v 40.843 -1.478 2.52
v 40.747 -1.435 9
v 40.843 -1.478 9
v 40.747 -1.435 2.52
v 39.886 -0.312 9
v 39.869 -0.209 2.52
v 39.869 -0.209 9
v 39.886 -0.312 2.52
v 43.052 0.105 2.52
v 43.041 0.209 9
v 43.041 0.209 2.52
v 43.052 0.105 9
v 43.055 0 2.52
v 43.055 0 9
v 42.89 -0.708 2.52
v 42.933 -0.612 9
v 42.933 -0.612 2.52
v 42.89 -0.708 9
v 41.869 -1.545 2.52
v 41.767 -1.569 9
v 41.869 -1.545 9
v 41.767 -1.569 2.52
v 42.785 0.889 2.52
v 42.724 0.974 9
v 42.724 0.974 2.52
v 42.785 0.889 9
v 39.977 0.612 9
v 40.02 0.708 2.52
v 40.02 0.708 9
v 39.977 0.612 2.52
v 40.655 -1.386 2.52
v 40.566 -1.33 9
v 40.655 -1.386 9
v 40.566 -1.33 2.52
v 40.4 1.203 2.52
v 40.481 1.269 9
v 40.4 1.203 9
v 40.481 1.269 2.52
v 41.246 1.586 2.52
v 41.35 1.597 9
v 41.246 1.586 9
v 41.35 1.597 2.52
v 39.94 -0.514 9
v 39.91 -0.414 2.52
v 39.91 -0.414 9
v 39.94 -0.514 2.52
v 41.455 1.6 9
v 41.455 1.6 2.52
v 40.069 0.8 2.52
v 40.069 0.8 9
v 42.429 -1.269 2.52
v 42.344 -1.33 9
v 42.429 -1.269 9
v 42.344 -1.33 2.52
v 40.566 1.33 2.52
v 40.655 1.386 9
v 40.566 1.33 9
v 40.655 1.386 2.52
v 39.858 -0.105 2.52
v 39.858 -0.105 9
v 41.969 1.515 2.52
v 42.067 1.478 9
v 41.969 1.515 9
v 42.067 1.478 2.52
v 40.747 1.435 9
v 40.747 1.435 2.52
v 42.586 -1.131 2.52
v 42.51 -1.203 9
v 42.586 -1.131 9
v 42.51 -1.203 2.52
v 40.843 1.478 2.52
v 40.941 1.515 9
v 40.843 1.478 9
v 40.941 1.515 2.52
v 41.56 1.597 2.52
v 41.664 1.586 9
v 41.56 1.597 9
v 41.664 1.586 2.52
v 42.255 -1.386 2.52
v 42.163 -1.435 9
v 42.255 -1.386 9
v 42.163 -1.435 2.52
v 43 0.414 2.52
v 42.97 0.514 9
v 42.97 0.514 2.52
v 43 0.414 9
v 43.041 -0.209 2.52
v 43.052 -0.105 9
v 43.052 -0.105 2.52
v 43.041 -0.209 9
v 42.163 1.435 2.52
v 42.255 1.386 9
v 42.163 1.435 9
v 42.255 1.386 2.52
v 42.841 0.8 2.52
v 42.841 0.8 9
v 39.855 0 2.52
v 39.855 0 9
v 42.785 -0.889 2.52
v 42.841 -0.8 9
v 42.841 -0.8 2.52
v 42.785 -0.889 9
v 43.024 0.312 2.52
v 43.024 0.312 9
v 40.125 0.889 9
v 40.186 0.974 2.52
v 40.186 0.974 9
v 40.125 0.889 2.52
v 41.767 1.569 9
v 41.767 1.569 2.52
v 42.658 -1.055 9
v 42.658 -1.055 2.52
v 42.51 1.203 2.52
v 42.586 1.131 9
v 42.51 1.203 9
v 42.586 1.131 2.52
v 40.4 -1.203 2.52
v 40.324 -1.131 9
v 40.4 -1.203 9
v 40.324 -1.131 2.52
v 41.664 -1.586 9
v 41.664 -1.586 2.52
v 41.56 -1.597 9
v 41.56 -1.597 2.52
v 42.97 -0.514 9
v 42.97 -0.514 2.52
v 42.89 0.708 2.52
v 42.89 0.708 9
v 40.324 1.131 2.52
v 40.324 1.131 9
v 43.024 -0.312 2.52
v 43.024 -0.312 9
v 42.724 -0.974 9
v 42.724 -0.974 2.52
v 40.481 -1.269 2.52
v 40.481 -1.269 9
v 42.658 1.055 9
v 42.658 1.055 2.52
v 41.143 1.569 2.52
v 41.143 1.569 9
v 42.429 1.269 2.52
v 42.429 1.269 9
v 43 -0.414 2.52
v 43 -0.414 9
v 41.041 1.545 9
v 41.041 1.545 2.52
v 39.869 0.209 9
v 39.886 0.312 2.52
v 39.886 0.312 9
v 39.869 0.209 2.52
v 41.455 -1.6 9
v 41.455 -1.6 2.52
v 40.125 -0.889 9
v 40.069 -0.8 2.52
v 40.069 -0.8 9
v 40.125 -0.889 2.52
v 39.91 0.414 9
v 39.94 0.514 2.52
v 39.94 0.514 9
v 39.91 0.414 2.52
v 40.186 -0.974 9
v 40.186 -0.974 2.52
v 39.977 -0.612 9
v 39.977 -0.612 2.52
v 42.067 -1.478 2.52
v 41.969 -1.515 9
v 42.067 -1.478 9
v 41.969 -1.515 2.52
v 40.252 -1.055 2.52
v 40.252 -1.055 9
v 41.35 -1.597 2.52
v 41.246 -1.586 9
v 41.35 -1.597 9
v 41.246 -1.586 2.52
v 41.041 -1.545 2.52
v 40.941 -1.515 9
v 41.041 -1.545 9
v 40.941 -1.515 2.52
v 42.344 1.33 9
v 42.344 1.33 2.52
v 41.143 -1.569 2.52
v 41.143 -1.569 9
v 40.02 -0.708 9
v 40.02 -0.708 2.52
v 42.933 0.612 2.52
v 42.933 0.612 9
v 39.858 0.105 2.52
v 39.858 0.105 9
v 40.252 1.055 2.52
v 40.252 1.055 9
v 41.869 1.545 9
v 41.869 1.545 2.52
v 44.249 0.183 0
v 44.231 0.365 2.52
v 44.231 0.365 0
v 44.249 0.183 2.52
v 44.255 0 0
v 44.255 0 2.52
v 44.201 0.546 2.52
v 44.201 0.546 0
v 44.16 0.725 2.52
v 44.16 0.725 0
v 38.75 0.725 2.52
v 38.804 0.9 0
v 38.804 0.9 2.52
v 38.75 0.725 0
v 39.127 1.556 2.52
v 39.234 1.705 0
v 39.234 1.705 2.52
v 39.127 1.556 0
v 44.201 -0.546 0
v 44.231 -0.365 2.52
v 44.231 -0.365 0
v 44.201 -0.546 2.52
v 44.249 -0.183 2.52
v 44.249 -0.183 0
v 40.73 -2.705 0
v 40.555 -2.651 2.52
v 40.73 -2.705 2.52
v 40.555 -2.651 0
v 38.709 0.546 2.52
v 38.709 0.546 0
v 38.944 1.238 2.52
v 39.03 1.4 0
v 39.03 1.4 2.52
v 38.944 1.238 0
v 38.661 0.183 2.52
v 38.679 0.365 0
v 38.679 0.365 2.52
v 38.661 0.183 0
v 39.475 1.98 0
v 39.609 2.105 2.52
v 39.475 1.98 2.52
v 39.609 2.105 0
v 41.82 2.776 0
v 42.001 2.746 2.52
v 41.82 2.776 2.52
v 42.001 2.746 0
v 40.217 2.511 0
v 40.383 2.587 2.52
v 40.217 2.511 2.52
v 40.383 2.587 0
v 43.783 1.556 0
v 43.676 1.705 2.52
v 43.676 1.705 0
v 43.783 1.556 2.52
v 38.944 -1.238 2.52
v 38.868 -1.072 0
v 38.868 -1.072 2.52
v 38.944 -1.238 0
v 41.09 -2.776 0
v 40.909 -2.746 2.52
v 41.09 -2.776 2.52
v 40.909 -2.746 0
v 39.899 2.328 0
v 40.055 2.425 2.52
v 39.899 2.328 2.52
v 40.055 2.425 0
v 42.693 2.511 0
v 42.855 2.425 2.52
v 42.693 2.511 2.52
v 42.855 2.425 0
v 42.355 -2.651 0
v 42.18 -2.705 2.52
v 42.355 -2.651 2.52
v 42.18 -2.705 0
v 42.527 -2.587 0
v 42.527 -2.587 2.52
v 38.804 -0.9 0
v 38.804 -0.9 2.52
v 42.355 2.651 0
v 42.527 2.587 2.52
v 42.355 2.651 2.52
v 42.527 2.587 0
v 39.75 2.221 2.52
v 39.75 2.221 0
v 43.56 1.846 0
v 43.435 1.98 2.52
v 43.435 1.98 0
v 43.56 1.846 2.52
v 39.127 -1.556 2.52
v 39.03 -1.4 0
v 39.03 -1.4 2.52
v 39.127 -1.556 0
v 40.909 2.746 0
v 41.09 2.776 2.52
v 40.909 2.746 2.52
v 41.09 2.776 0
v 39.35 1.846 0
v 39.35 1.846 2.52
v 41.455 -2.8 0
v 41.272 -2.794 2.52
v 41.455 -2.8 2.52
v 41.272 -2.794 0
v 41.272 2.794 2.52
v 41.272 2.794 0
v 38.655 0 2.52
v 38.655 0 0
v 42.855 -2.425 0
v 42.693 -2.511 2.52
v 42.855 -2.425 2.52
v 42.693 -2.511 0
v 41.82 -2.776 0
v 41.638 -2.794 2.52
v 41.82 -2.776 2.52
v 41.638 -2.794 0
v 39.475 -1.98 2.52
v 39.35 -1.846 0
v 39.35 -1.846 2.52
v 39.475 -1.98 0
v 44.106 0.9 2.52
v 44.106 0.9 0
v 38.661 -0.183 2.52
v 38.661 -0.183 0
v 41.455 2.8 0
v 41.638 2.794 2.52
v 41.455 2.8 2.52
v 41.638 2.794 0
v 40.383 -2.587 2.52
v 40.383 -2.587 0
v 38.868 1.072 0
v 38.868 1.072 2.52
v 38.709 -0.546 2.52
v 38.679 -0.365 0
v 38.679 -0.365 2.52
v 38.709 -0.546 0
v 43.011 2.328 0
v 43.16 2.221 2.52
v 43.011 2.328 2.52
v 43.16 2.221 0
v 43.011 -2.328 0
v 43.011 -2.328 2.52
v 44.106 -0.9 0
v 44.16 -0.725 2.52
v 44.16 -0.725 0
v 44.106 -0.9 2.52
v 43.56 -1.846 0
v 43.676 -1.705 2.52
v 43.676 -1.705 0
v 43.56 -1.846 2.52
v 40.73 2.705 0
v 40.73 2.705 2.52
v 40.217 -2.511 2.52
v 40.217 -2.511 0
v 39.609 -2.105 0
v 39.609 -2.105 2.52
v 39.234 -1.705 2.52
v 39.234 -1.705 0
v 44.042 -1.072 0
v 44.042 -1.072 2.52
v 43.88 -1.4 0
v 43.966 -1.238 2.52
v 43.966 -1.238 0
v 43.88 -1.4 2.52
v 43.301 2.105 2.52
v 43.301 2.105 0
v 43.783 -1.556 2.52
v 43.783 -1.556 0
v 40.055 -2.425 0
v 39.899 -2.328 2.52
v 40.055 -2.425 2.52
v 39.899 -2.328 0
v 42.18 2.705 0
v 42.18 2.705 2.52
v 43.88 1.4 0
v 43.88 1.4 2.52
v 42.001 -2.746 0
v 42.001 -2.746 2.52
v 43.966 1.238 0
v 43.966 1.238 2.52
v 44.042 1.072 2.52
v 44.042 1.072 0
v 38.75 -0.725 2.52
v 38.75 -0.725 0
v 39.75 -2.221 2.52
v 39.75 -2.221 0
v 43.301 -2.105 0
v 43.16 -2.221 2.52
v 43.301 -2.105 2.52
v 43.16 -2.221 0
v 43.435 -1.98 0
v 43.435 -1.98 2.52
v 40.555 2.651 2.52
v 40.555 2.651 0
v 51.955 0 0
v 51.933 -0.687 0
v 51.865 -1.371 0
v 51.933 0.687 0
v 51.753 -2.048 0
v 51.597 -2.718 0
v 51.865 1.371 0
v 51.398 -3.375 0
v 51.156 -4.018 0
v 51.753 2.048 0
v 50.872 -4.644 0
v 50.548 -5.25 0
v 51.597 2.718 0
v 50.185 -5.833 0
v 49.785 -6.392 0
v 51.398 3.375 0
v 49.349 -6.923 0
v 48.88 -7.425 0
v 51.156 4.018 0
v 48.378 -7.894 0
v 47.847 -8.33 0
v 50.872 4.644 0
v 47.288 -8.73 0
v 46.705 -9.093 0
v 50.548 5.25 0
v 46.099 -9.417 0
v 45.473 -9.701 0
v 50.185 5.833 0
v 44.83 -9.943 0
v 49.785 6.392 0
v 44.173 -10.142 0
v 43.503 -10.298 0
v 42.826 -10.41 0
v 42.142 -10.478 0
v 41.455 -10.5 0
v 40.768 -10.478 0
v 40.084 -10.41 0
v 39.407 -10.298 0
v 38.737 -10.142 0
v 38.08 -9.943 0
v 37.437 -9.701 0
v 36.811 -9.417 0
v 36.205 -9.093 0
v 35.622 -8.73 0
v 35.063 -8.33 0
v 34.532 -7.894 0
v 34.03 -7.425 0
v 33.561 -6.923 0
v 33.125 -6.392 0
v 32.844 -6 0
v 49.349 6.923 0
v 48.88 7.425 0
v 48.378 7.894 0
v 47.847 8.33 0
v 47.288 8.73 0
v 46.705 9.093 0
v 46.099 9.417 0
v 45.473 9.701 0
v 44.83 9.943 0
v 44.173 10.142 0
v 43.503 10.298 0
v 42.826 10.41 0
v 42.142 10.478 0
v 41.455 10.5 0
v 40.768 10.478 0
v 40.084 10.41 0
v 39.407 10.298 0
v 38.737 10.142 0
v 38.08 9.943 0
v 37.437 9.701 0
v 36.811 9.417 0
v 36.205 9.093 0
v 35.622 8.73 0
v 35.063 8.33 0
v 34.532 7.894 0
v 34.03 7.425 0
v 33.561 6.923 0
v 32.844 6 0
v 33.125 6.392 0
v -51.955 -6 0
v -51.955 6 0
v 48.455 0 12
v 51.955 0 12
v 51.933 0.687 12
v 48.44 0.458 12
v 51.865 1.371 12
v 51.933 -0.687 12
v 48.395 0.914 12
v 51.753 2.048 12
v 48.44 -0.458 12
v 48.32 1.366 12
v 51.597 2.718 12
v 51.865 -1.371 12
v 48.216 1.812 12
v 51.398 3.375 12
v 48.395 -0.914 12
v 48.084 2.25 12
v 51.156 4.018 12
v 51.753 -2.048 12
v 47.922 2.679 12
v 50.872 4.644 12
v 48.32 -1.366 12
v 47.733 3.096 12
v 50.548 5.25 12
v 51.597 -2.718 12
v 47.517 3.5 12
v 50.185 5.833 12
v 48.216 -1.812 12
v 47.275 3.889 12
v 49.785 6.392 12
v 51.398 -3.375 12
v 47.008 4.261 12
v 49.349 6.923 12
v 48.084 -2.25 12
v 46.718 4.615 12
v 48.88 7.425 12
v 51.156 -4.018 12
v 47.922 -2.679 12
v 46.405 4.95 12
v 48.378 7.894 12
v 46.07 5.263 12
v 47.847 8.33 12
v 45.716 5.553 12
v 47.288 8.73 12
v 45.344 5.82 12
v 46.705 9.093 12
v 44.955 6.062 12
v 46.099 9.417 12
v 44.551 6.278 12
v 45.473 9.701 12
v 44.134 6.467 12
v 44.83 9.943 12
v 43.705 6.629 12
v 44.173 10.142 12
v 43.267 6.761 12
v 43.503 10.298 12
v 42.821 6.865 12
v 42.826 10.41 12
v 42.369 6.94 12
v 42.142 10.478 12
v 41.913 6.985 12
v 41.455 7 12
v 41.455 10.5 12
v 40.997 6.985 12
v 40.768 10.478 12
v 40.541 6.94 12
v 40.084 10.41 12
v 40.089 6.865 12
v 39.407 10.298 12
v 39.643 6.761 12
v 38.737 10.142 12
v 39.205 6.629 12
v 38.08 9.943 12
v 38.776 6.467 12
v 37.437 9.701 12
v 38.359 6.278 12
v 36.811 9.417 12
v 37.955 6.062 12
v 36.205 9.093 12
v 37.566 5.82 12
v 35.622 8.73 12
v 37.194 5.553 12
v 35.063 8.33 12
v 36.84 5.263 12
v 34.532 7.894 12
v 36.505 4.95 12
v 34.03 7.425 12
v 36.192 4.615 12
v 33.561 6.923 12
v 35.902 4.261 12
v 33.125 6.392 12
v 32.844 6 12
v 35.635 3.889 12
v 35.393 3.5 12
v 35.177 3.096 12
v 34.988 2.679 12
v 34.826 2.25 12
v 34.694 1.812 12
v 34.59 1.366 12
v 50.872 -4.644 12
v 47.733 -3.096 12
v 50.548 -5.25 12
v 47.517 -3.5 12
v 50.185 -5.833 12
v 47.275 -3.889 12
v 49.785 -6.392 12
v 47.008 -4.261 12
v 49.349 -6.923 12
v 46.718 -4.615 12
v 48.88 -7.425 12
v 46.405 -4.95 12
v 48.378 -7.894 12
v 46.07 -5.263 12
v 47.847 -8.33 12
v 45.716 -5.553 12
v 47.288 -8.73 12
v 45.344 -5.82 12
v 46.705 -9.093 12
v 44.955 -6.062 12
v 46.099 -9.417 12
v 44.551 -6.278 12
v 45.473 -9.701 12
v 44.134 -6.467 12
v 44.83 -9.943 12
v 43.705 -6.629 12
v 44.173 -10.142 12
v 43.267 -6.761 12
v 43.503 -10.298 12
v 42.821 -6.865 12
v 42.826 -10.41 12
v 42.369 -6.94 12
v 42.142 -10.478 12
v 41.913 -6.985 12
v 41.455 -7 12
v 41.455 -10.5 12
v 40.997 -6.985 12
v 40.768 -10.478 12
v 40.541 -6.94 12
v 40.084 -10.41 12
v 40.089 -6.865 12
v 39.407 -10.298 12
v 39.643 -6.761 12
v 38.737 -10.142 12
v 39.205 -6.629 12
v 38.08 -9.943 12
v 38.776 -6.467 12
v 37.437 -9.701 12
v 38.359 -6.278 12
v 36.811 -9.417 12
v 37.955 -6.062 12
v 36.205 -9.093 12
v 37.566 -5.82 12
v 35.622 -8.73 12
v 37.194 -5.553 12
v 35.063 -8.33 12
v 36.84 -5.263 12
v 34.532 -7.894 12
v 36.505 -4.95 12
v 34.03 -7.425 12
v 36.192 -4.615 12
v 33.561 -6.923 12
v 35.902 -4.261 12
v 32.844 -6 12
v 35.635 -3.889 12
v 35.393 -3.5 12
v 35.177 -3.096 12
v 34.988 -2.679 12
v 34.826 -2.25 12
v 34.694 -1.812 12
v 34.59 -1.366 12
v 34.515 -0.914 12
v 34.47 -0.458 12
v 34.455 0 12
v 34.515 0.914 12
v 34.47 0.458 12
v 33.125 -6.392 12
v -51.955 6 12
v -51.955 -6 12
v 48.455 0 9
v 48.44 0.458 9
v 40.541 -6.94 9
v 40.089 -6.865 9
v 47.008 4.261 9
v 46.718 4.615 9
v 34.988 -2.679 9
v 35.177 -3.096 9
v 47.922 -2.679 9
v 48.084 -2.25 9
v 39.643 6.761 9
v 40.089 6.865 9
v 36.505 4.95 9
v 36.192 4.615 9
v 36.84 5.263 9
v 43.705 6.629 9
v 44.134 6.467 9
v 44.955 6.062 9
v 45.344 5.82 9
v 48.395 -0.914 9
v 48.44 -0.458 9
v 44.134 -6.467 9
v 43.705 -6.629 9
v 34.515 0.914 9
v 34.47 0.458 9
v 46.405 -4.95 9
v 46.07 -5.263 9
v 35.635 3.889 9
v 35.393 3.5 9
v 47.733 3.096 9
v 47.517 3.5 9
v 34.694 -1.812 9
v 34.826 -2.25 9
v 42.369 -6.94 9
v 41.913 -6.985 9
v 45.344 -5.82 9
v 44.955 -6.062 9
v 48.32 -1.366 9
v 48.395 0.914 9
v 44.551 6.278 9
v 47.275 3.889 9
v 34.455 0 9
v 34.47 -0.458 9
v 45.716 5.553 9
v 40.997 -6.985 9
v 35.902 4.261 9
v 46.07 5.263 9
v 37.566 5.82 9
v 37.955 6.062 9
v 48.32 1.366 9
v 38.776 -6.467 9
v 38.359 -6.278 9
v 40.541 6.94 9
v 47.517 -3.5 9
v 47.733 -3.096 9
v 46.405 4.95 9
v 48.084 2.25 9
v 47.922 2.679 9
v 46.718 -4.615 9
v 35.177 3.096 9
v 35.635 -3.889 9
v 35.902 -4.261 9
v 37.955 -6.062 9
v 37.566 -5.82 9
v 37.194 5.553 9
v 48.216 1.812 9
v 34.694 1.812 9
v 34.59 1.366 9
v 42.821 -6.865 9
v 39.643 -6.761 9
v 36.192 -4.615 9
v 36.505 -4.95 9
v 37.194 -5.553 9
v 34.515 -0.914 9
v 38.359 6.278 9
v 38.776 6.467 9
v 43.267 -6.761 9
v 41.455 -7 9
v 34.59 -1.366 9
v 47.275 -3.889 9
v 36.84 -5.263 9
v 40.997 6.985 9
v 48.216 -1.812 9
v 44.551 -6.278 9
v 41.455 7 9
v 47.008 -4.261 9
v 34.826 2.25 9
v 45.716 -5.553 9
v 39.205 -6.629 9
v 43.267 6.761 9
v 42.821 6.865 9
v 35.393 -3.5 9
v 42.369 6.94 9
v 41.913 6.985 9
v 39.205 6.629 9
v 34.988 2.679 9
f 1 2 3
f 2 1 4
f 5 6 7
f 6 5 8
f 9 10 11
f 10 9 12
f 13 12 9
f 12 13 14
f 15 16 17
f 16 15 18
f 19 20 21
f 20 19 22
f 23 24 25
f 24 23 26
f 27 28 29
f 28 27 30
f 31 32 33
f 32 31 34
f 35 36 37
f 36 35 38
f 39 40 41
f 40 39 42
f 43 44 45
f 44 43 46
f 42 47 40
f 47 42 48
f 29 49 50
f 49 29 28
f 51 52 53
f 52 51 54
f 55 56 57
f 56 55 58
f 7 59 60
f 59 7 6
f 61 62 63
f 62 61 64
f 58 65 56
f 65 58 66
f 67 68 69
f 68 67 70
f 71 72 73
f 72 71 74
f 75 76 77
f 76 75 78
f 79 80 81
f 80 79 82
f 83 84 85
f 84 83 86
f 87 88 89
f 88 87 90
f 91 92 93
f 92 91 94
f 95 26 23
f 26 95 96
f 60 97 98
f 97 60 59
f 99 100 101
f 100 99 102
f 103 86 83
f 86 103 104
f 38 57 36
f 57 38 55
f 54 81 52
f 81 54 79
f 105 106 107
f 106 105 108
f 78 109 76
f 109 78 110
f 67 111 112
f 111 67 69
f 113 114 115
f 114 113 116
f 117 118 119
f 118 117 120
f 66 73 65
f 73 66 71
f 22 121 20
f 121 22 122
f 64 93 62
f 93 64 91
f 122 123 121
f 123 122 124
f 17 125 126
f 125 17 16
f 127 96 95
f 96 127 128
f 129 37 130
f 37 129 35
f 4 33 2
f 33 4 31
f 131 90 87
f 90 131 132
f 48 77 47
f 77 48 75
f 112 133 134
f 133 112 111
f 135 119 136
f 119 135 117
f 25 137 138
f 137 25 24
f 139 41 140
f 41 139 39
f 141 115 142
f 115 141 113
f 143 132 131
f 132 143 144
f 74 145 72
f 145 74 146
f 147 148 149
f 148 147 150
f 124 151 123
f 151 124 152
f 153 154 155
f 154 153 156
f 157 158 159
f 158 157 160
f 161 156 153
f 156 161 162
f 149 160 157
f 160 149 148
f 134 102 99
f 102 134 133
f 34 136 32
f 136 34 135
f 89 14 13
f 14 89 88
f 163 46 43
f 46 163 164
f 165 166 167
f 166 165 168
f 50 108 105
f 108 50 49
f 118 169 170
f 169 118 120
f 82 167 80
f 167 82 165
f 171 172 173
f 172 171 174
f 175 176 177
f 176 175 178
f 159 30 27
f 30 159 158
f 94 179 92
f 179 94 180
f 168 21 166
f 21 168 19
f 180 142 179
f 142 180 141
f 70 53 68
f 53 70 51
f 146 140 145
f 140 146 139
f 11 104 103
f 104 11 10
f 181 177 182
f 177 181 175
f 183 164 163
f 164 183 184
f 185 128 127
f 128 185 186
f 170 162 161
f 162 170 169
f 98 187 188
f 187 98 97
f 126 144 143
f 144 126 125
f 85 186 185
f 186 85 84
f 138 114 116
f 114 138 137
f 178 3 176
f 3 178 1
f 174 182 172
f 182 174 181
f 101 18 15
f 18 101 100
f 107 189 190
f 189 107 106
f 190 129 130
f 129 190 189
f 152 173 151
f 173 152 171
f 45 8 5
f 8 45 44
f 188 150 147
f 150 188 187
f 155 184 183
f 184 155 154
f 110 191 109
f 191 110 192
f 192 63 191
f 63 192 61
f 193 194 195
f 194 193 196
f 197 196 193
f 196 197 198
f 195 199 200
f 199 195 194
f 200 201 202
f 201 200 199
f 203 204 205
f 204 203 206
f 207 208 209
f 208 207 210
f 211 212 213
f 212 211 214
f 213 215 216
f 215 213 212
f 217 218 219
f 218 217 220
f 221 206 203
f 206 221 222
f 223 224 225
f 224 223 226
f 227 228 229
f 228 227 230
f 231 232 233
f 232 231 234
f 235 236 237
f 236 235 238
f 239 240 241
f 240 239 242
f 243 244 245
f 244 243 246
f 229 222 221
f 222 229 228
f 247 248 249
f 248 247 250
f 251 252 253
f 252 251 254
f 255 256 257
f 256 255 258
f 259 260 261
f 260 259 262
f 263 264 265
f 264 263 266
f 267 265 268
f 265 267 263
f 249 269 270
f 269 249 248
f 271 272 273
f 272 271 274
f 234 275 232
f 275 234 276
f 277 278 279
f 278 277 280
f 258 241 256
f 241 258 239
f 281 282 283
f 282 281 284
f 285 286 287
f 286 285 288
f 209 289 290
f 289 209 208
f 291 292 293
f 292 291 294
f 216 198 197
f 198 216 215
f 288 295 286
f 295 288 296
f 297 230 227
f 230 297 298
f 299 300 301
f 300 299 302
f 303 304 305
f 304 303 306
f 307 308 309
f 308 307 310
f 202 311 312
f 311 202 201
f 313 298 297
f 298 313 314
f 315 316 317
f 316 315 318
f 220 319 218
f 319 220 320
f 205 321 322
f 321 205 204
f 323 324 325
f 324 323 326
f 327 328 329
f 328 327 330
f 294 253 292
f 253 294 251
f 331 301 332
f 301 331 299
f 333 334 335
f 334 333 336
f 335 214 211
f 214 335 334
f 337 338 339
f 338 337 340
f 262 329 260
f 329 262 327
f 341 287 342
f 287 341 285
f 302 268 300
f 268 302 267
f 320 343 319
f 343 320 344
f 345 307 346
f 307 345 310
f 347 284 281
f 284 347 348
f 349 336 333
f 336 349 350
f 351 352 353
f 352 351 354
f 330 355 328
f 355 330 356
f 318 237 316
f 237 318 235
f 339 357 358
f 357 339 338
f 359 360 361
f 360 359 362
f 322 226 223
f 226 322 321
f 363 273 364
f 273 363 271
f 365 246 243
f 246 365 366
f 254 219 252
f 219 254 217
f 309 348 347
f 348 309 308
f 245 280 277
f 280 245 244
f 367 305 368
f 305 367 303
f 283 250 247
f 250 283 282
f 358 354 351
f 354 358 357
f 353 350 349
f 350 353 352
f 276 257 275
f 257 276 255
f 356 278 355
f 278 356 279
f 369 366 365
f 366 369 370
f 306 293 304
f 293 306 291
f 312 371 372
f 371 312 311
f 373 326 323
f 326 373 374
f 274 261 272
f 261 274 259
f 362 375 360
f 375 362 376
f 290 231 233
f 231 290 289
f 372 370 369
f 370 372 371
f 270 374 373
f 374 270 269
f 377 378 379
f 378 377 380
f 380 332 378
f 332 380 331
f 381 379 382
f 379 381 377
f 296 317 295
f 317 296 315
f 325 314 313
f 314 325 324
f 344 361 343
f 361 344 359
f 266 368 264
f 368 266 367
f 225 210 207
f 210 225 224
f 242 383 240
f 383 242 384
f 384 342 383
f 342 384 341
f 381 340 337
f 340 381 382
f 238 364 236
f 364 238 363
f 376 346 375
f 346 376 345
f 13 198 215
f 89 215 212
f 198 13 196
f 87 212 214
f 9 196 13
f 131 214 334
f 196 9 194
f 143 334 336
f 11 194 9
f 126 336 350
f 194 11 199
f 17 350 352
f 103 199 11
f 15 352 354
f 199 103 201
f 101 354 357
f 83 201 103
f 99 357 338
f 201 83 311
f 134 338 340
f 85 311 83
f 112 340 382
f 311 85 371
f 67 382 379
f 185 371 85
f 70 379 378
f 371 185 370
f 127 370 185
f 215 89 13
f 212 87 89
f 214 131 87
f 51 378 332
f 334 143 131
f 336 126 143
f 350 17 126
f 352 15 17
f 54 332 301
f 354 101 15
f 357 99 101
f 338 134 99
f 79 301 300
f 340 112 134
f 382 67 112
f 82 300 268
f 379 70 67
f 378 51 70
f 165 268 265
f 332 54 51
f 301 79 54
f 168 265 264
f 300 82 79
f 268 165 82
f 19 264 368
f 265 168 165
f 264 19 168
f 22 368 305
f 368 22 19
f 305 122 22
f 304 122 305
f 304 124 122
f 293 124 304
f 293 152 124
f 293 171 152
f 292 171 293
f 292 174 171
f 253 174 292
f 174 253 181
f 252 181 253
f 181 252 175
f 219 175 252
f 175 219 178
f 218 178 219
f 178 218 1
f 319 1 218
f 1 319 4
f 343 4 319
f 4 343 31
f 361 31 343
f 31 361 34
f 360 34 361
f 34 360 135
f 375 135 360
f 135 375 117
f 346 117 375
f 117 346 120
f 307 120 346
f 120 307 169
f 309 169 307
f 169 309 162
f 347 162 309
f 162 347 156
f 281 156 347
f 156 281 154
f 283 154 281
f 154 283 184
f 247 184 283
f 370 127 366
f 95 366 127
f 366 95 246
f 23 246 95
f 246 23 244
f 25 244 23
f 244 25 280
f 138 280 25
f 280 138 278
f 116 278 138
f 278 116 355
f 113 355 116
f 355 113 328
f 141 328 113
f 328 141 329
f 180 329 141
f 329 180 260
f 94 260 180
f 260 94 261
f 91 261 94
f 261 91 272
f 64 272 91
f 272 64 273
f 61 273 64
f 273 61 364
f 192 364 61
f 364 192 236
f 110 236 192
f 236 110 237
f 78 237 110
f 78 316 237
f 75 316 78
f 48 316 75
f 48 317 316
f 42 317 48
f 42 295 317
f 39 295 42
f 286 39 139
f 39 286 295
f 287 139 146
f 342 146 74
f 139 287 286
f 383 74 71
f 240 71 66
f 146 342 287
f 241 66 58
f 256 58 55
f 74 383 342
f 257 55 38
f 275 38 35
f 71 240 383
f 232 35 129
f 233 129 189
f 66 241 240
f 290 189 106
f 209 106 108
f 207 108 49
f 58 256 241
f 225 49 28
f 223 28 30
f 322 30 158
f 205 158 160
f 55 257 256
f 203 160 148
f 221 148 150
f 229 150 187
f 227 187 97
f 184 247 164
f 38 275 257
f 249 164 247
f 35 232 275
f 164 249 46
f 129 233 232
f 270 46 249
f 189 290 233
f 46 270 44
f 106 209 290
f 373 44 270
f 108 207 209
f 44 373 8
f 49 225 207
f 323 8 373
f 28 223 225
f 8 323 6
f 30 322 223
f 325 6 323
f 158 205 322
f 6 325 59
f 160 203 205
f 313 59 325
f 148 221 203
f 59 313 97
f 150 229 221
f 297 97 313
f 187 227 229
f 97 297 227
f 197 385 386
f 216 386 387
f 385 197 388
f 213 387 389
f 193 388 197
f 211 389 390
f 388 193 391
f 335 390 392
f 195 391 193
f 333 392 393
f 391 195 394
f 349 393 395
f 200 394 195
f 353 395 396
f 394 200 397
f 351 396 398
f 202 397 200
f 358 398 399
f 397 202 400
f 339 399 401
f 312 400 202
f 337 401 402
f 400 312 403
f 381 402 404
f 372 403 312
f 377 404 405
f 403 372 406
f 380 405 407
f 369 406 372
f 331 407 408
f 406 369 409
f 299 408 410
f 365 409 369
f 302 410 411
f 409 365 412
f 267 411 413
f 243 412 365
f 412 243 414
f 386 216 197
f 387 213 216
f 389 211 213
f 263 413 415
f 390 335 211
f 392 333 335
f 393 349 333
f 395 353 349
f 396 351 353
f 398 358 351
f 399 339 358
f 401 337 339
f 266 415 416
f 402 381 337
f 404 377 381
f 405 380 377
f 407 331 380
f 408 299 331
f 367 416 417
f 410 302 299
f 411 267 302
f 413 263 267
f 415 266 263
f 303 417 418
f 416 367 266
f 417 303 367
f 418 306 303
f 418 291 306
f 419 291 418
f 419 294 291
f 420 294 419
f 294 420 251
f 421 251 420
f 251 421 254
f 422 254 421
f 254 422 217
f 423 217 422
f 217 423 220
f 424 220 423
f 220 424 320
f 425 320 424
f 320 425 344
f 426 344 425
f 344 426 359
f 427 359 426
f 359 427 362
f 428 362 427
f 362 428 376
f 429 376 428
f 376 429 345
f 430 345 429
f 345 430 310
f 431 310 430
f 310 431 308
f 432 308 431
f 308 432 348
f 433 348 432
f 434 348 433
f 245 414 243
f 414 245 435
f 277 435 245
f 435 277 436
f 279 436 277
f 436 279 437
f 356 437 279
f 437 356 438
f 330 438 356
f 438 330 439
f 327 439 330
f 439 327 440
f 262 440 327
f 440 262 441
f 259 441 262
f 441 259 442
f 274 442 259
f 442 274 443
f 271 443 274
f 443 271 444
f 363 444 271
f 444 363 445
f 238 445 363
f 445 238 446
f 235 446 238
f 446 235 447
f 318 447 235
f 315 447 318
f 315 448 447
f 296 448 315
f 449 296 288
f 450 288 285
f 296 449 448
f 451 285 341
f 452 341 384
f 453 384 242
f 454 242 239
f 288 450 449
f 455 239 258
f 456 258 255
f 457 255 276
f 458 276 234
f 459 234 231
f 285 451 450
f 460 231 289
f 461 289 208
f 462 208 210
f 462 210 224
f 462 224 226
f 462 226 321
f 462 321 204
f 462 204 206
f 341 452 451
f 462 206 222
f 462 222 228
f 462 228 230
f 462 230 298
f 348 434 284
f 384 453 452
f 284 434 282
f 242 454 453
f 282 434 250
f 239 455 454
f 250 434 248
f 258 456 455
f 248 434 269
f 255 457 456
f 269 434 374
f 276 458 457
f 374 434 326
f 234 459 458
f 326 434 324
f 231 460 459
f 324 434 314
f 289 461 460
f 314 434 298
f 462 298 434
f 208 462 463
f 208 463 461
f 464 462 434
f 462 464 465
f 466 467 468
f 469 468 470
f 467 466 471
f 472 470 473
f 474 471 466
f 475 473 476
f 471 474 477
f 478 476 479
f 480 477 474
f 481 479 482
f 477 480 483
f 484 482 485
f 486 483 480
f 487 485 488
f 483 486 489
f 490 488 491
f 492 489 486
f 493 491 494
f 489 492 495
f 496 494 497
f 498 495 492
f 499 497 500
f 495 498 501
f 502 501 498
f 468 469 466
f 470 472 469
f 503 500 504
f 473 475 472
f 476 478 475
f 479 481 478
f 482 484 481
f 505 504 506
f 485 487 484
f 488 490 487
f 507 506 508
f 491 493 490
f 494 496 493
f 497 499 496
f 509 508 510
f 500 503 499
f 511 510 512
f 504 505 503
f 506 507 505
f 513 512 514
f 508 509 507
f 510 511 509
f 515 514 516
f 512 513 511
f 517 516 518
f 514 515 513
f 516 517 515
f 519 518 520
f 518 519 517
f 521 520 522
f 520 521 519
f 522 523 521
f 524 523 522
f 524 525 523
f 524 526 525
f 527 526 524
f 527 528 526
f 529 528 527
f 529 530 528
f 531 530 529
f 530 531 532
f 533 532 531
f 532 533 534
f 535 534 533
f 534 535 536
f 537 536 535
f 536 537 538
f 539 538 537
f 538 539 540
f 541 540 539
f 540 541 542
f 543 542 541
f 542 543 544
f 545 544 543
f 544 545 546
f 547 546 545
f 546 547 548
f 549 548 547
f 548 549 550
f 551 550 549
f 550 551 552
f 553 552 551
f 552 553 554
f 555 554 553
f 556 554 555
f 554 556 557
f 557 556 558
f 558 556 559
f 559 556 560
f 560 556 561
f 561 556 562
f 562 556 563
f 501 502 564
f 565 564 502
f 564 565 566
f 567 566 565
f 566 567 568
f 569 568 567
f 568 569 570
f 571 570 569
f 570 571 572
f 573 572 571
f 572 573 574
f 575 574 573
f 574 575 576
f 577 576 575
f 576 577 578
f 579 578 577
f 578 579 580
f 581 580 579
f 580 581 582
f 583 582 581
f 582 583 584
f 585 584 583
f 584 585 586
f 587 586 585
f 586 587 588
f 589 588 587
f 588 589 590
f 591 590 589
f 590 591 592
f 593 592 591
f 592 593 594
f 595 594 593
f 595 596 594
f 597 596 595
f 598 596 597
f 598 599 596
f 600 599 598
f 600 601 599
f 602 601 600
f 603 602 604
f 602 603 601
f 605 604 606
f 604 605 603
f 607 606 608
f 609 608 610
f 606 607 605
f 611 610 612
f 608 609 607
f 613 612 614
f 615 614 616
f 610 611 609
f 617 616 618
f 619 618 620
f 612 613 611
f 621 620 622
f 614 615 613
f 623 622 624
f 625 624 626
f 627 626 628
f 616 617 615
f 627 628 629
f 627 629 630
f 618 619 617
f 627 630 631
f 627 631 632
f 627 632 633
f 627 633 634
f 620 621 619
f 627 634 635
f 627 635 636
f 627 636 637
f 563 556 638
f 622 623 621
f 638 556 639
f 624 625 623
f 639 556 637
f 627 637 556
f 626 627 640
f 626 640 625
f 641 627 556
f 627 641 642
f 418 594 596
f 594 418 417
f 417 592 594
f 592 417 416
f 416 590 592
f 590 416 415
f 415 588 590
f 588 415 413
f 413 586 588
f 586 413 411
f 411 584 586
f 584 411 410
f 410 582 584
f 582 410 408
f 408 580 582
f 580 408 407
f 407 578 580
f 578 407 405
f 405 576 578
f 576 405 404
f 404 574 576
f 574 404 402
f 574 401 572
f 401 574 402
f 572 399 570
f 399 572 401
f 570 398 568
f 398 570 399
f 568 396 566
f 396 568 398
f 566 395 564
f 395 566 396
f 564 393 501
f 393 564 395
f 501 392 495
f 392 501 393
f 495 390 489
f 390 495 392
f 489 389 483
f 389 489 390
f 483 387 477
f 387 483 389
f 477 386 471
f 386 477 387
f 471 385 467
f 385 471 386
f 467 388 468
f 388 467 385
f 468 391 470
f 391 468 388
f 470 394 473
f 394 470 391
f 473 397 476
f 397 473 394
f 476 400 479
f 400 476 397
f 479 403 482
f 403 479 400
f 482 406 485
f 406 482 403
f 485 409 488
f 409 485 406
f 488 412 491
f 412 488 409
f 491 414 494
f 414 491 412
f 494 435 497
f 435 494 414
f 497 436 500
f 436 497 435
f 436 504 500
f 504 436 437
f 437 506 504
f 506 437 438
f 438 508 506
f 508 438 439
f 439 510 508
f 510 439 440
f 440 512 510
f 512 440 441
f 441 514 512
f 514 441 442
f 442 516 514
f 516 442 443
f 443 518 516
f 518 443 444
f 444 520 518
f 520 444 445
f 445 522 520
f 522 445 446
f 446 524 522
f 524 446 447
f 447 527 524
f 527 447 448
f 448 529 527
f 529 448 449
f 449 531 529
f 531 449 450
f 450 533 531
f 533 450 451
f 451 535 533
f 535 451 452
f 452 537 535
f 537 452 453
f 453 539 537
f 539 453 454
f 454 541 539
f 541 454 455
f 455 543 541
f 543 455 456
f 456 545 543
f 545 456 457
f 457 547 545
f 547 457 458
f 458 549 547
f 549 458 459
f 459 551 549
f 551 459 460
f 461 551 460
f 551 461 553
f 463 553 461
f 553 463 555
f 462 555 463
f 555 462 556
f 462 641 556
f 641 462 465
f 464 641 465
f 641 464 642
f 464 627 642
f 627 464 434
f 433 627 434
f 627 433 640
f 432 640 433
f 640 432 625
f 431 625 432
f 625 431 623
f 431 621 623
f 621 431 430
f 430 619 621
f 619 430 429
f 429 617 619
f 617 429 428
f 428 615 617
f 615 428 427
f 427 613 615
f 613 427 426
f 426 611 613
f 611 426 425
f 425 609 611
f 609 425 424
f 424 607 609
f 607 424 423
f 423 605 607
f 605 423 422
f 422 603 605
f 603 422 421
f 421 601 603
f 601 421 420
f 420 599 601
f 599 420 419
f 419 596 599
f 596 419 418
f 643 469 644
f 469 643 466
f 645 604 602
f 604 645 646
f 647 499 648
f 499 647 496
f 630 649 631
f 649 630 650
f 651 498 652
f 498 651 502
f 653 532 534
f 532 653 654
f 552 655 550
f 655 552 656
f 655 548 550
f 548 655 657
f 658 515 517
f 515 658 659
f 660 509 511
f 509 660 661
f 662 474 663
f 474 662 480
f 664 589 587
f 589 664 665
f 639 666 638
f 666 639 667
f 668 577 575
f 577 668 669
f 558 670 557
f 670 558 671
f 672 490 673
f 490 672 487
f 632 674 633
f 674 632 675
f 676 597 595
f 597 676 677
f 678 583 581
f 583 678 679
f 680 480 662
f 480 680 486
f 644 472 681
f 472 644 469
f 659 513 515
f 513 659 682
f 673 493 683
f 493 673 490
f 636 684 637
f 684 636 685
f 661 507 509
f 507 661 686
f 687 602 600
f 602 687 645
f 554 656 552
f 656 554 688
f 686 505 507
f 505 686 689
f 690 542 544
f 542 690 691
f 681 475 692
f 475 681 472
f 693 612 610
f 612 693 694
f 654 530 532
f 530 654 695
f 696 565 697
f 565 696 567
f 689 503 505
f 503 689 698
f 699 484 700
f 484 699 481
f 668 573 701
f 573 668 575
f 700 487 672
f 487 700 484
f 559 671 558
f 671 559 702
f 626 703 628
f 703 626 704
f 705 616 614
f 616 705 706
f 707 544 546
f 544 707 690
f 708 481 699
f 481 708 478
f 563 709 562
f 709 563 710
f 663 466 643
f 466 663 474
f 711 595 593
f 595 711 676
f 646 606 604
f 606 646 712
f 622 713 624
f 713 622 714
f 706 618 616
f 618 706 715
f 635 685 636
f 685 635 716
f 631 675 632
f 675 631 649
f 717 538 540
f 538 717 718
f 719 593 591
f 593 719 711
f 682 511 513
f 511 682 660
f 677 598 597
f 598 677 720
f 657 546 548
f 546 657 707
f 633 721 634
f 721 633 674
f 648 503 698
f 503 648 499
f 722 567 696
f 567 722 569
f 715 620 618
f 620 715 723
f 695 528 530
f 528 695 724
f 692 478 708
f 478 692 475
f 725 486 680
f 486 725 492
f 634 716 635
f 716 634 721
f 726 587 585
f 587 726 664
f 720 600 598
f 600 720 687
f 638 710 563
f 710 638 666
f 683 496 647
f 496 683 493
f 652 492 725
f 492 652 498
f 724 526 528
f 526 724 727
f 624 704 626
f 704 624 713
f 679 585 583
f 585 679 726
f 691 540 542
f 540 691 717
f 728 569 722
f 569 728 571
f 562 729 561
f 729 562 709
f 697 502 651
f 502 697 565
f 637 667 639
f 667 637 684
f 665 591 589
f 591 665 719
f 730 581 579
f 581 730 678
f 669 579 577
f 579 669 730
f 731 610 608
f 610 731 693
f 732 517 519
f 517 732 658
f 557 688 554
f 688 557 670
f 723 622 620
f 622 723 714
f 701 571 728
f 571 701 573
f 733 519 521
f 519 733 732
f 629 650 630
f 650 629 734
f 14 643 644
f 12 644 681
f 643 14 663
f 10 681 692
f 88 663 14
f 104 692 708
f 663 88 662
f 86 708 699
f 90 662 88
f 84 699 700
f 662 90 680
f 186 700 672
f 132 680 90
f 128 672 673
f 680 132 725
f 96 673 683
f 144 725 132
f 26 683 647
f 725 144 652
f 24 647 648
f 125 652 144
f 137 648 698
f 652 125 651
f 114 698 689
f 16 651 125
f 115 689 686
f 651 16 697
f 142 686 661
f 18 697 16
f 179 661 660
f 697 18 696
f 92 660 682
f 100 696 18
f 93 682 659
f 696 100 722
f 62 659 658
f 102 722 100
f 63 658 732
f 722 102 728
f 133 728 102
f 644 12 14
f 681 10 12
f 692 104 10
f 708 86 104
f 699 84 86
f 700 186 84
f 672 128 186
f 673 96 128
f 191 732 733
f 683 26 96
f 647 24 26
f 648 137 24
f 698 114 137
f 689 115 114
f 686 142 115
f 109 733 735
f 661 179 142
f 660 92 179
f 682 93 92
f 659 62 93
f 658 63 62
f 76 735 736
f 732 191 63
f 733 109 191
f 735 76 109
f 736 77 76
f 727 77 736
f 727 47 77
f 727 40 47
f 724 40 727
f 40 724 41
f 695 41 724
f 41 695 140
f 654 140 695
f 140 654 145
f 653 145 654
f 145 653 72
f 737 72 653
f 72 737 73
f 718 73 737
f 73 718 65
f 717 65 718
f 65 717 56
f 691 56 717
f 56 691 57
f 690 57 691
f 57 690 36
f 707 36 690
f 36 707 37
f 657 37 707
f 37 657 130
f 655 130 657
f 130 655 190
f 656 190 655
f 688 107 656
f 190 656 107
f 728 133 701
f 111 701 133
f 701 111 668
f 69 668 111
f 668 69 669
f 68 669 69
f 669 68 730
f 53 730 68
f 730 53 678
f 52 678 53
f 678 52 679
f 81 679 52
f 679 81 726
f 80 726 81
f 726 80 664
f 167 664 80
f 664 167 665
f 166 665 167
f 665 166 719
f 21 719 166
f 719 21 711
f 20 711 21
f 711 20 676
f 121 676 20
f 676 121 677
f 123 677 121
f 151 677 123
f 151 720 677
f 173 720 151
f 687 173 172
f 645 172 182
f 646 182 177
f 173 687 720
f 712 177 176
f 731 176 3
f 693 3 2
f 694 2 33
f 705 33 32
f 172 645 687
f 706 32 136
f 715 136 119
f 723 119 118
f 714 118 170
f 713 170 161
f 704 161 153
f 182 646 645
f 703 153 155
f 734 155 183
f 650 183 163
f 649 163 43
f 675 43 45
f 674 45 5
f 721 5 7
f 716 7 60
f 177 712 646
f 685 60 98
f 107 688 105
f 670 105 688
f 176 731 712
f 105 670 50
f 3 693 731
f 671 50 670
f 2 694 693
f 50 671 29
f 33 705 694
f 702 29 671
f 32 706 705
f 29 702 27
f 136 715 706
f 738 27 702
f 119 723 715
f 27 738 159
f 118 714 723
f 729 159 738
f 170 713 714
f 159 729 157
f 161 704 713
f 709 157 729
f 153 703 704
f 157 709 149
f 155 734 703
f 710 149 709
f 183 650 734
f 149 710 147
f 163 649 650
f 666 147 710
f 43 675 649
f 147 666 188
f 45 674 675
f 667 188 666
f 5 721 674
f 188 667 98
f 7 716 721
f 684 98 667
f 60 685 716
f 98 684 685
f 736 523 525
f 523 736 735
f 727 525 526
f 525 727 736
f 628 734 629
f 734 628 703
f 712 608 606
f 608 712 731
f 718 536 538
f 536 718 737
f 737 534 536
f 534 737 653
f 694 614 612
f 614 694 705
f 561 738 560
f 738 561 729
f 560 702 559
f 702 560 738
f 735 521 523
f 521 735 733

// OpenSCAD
// Parametric arm for the hotbed foot/camera mount.
// v2 defaults match the requested "new default" OpenSCAD parameter set.
// Self-contained OpenSCAD model; does not import or reference STL files.

/* [Arm body] */
// Overall arm length from the square end to the far side of the round end.
arm_length = 103.91; // [30:0.1:180]
// Straight arm width.
arm_width = 12.00; // [6:0.1:60]
// Arm thickness/height. Default matches the hotbed foot height.
arm_height = 12.00; // [2:0.1:30]

/* [Round end] */
// Diameter of the round section at the end of the arm.
end_circle_diameter = 21.00; // [10:0.1:80]
// Segment count for the round end and screw hole.
round_detail = 96; // [32, 48, 64, 96, 128]

/* [Raised / lowered circle pad] */
// Raised adds material above the round end; Lowered cuts a circular recess; Flush disables the feature.
pad_style = "Lowered"; // [Raised, Lowered, Flush]
// Diameter of the raised/lowered circular pad area.
pad_diameter = 14.00; // [6:0.1:70]
// Height of raised pad or depth of lowered recess.
pad_height = 3.00; // [0.2:0.1:12]

/* [M3 screw hole] */
// M3 clearance hole diameter.
m3_hole_diameter = 3.20; // [2.8:0.05:4.0]
// Optional counterbore diameter. Set style to None to disable.
counterbore_style = "Lowered side"; // [None, Raised side, Lowered side]
// Counterbore diameter for screw head clearance.
counterbore_diameter = 5.60; // [4:0.1:12]
// Counterbore depth.
counterbore_depth = 2.50; // [0.5:0.1:8]

/* [Placement] */
// Centered places the arm around the origin; Positive X starts the square end at X=0.
model_position = "Centered"; // [Centered, Positive X]

module rounded_arm_2d(length, width, end_diameter) {
  circle_center_x = length / 2 - end_diameter / 2;

  union() {
    translate([-length / 2, -width / 2])
      square([max(circle_center_x + length / 2, 0.01), width]);

    translate([circle_center_x, 0])
      circle(d = end_diameter, $fn = round_detail);
  }
}

module arm_base(length, width, height, end_diameter) {
  linear_extrude(height = height)
    rounded_arm_2d(length, width, end_diameter);
}

module circle_pad(length, height, end_diameter, diameter, style, feature_height) {
  circle_center_x = length / 2 - end_diameter / 2;

  if (style == "Raised") {
    translate([circle_center_x, 0, height])
      cylinder(h = feature_height, d = diameter, $fn = round_detail);
  }
}

module pad_recess_cut(length, height, end_diameter, diameter, style, feature_height) {
  circle_center_x = length / 2 - end_diameter / 2;

  if (style == "Lowered") {
    translate([circle_center_x, 0, height - feature_height])
      cylinder(h = feature_height + 0.02, d = diameter, $fn = round_detail);
  }
}

module screw_cuts(length, height, end_diameter) {
  circle_center_x = length / 2 - end_diameter / 2;
  total_cut_height = height + (pad_style == "Raised" ? pad_height : 0) + 0.04;

  translate([circle_center_x, 0, -0.02])
    cylinder(h = total_cut_height, d = m3_hole_diameter, $fn = round_detail);

  if (counterbore_style == "Raised side") {
    translate([circle_center_x, 0, height + (pad_style == "Raised" ? pad_height : 0) - counterbore_depth])
      cylinder(h = counterbore_depth + 0.04, d = counterbore_diameter, $fn = round_detail);
  }

  if (counterbore_style == "Lowered side") {
    translate([circle_center_x, 0, -0.02])
      cylinder(h = counterbore_depth + 0.04, d = counterbore_diameter, $fn = round_detail);
  }
}

module hotbed_foot_arm_v2(
  length = arm_length,
  width = arm_width,
  height = arm_height,
  end_diameter = end_circle_diameter,
  position = model_position
) {
  placement = position == "Positive X" ? [length / 2, 0, 0] : [0, 0, 0];

  translate(placement)
    difference() {
      union() {
        arm_base(length, width, height, end_diameter);
        circle_pad(length, height, end_diameter, pad_diameter, pad_style, pad_height);
      }

      pad_recess_cut(length, height, end_diameter, pad_diameter, pad_style, pad_height);
      screw_cuts(length, height, end_diameter);
    }
}

hotbed_foot_arm_v2();
